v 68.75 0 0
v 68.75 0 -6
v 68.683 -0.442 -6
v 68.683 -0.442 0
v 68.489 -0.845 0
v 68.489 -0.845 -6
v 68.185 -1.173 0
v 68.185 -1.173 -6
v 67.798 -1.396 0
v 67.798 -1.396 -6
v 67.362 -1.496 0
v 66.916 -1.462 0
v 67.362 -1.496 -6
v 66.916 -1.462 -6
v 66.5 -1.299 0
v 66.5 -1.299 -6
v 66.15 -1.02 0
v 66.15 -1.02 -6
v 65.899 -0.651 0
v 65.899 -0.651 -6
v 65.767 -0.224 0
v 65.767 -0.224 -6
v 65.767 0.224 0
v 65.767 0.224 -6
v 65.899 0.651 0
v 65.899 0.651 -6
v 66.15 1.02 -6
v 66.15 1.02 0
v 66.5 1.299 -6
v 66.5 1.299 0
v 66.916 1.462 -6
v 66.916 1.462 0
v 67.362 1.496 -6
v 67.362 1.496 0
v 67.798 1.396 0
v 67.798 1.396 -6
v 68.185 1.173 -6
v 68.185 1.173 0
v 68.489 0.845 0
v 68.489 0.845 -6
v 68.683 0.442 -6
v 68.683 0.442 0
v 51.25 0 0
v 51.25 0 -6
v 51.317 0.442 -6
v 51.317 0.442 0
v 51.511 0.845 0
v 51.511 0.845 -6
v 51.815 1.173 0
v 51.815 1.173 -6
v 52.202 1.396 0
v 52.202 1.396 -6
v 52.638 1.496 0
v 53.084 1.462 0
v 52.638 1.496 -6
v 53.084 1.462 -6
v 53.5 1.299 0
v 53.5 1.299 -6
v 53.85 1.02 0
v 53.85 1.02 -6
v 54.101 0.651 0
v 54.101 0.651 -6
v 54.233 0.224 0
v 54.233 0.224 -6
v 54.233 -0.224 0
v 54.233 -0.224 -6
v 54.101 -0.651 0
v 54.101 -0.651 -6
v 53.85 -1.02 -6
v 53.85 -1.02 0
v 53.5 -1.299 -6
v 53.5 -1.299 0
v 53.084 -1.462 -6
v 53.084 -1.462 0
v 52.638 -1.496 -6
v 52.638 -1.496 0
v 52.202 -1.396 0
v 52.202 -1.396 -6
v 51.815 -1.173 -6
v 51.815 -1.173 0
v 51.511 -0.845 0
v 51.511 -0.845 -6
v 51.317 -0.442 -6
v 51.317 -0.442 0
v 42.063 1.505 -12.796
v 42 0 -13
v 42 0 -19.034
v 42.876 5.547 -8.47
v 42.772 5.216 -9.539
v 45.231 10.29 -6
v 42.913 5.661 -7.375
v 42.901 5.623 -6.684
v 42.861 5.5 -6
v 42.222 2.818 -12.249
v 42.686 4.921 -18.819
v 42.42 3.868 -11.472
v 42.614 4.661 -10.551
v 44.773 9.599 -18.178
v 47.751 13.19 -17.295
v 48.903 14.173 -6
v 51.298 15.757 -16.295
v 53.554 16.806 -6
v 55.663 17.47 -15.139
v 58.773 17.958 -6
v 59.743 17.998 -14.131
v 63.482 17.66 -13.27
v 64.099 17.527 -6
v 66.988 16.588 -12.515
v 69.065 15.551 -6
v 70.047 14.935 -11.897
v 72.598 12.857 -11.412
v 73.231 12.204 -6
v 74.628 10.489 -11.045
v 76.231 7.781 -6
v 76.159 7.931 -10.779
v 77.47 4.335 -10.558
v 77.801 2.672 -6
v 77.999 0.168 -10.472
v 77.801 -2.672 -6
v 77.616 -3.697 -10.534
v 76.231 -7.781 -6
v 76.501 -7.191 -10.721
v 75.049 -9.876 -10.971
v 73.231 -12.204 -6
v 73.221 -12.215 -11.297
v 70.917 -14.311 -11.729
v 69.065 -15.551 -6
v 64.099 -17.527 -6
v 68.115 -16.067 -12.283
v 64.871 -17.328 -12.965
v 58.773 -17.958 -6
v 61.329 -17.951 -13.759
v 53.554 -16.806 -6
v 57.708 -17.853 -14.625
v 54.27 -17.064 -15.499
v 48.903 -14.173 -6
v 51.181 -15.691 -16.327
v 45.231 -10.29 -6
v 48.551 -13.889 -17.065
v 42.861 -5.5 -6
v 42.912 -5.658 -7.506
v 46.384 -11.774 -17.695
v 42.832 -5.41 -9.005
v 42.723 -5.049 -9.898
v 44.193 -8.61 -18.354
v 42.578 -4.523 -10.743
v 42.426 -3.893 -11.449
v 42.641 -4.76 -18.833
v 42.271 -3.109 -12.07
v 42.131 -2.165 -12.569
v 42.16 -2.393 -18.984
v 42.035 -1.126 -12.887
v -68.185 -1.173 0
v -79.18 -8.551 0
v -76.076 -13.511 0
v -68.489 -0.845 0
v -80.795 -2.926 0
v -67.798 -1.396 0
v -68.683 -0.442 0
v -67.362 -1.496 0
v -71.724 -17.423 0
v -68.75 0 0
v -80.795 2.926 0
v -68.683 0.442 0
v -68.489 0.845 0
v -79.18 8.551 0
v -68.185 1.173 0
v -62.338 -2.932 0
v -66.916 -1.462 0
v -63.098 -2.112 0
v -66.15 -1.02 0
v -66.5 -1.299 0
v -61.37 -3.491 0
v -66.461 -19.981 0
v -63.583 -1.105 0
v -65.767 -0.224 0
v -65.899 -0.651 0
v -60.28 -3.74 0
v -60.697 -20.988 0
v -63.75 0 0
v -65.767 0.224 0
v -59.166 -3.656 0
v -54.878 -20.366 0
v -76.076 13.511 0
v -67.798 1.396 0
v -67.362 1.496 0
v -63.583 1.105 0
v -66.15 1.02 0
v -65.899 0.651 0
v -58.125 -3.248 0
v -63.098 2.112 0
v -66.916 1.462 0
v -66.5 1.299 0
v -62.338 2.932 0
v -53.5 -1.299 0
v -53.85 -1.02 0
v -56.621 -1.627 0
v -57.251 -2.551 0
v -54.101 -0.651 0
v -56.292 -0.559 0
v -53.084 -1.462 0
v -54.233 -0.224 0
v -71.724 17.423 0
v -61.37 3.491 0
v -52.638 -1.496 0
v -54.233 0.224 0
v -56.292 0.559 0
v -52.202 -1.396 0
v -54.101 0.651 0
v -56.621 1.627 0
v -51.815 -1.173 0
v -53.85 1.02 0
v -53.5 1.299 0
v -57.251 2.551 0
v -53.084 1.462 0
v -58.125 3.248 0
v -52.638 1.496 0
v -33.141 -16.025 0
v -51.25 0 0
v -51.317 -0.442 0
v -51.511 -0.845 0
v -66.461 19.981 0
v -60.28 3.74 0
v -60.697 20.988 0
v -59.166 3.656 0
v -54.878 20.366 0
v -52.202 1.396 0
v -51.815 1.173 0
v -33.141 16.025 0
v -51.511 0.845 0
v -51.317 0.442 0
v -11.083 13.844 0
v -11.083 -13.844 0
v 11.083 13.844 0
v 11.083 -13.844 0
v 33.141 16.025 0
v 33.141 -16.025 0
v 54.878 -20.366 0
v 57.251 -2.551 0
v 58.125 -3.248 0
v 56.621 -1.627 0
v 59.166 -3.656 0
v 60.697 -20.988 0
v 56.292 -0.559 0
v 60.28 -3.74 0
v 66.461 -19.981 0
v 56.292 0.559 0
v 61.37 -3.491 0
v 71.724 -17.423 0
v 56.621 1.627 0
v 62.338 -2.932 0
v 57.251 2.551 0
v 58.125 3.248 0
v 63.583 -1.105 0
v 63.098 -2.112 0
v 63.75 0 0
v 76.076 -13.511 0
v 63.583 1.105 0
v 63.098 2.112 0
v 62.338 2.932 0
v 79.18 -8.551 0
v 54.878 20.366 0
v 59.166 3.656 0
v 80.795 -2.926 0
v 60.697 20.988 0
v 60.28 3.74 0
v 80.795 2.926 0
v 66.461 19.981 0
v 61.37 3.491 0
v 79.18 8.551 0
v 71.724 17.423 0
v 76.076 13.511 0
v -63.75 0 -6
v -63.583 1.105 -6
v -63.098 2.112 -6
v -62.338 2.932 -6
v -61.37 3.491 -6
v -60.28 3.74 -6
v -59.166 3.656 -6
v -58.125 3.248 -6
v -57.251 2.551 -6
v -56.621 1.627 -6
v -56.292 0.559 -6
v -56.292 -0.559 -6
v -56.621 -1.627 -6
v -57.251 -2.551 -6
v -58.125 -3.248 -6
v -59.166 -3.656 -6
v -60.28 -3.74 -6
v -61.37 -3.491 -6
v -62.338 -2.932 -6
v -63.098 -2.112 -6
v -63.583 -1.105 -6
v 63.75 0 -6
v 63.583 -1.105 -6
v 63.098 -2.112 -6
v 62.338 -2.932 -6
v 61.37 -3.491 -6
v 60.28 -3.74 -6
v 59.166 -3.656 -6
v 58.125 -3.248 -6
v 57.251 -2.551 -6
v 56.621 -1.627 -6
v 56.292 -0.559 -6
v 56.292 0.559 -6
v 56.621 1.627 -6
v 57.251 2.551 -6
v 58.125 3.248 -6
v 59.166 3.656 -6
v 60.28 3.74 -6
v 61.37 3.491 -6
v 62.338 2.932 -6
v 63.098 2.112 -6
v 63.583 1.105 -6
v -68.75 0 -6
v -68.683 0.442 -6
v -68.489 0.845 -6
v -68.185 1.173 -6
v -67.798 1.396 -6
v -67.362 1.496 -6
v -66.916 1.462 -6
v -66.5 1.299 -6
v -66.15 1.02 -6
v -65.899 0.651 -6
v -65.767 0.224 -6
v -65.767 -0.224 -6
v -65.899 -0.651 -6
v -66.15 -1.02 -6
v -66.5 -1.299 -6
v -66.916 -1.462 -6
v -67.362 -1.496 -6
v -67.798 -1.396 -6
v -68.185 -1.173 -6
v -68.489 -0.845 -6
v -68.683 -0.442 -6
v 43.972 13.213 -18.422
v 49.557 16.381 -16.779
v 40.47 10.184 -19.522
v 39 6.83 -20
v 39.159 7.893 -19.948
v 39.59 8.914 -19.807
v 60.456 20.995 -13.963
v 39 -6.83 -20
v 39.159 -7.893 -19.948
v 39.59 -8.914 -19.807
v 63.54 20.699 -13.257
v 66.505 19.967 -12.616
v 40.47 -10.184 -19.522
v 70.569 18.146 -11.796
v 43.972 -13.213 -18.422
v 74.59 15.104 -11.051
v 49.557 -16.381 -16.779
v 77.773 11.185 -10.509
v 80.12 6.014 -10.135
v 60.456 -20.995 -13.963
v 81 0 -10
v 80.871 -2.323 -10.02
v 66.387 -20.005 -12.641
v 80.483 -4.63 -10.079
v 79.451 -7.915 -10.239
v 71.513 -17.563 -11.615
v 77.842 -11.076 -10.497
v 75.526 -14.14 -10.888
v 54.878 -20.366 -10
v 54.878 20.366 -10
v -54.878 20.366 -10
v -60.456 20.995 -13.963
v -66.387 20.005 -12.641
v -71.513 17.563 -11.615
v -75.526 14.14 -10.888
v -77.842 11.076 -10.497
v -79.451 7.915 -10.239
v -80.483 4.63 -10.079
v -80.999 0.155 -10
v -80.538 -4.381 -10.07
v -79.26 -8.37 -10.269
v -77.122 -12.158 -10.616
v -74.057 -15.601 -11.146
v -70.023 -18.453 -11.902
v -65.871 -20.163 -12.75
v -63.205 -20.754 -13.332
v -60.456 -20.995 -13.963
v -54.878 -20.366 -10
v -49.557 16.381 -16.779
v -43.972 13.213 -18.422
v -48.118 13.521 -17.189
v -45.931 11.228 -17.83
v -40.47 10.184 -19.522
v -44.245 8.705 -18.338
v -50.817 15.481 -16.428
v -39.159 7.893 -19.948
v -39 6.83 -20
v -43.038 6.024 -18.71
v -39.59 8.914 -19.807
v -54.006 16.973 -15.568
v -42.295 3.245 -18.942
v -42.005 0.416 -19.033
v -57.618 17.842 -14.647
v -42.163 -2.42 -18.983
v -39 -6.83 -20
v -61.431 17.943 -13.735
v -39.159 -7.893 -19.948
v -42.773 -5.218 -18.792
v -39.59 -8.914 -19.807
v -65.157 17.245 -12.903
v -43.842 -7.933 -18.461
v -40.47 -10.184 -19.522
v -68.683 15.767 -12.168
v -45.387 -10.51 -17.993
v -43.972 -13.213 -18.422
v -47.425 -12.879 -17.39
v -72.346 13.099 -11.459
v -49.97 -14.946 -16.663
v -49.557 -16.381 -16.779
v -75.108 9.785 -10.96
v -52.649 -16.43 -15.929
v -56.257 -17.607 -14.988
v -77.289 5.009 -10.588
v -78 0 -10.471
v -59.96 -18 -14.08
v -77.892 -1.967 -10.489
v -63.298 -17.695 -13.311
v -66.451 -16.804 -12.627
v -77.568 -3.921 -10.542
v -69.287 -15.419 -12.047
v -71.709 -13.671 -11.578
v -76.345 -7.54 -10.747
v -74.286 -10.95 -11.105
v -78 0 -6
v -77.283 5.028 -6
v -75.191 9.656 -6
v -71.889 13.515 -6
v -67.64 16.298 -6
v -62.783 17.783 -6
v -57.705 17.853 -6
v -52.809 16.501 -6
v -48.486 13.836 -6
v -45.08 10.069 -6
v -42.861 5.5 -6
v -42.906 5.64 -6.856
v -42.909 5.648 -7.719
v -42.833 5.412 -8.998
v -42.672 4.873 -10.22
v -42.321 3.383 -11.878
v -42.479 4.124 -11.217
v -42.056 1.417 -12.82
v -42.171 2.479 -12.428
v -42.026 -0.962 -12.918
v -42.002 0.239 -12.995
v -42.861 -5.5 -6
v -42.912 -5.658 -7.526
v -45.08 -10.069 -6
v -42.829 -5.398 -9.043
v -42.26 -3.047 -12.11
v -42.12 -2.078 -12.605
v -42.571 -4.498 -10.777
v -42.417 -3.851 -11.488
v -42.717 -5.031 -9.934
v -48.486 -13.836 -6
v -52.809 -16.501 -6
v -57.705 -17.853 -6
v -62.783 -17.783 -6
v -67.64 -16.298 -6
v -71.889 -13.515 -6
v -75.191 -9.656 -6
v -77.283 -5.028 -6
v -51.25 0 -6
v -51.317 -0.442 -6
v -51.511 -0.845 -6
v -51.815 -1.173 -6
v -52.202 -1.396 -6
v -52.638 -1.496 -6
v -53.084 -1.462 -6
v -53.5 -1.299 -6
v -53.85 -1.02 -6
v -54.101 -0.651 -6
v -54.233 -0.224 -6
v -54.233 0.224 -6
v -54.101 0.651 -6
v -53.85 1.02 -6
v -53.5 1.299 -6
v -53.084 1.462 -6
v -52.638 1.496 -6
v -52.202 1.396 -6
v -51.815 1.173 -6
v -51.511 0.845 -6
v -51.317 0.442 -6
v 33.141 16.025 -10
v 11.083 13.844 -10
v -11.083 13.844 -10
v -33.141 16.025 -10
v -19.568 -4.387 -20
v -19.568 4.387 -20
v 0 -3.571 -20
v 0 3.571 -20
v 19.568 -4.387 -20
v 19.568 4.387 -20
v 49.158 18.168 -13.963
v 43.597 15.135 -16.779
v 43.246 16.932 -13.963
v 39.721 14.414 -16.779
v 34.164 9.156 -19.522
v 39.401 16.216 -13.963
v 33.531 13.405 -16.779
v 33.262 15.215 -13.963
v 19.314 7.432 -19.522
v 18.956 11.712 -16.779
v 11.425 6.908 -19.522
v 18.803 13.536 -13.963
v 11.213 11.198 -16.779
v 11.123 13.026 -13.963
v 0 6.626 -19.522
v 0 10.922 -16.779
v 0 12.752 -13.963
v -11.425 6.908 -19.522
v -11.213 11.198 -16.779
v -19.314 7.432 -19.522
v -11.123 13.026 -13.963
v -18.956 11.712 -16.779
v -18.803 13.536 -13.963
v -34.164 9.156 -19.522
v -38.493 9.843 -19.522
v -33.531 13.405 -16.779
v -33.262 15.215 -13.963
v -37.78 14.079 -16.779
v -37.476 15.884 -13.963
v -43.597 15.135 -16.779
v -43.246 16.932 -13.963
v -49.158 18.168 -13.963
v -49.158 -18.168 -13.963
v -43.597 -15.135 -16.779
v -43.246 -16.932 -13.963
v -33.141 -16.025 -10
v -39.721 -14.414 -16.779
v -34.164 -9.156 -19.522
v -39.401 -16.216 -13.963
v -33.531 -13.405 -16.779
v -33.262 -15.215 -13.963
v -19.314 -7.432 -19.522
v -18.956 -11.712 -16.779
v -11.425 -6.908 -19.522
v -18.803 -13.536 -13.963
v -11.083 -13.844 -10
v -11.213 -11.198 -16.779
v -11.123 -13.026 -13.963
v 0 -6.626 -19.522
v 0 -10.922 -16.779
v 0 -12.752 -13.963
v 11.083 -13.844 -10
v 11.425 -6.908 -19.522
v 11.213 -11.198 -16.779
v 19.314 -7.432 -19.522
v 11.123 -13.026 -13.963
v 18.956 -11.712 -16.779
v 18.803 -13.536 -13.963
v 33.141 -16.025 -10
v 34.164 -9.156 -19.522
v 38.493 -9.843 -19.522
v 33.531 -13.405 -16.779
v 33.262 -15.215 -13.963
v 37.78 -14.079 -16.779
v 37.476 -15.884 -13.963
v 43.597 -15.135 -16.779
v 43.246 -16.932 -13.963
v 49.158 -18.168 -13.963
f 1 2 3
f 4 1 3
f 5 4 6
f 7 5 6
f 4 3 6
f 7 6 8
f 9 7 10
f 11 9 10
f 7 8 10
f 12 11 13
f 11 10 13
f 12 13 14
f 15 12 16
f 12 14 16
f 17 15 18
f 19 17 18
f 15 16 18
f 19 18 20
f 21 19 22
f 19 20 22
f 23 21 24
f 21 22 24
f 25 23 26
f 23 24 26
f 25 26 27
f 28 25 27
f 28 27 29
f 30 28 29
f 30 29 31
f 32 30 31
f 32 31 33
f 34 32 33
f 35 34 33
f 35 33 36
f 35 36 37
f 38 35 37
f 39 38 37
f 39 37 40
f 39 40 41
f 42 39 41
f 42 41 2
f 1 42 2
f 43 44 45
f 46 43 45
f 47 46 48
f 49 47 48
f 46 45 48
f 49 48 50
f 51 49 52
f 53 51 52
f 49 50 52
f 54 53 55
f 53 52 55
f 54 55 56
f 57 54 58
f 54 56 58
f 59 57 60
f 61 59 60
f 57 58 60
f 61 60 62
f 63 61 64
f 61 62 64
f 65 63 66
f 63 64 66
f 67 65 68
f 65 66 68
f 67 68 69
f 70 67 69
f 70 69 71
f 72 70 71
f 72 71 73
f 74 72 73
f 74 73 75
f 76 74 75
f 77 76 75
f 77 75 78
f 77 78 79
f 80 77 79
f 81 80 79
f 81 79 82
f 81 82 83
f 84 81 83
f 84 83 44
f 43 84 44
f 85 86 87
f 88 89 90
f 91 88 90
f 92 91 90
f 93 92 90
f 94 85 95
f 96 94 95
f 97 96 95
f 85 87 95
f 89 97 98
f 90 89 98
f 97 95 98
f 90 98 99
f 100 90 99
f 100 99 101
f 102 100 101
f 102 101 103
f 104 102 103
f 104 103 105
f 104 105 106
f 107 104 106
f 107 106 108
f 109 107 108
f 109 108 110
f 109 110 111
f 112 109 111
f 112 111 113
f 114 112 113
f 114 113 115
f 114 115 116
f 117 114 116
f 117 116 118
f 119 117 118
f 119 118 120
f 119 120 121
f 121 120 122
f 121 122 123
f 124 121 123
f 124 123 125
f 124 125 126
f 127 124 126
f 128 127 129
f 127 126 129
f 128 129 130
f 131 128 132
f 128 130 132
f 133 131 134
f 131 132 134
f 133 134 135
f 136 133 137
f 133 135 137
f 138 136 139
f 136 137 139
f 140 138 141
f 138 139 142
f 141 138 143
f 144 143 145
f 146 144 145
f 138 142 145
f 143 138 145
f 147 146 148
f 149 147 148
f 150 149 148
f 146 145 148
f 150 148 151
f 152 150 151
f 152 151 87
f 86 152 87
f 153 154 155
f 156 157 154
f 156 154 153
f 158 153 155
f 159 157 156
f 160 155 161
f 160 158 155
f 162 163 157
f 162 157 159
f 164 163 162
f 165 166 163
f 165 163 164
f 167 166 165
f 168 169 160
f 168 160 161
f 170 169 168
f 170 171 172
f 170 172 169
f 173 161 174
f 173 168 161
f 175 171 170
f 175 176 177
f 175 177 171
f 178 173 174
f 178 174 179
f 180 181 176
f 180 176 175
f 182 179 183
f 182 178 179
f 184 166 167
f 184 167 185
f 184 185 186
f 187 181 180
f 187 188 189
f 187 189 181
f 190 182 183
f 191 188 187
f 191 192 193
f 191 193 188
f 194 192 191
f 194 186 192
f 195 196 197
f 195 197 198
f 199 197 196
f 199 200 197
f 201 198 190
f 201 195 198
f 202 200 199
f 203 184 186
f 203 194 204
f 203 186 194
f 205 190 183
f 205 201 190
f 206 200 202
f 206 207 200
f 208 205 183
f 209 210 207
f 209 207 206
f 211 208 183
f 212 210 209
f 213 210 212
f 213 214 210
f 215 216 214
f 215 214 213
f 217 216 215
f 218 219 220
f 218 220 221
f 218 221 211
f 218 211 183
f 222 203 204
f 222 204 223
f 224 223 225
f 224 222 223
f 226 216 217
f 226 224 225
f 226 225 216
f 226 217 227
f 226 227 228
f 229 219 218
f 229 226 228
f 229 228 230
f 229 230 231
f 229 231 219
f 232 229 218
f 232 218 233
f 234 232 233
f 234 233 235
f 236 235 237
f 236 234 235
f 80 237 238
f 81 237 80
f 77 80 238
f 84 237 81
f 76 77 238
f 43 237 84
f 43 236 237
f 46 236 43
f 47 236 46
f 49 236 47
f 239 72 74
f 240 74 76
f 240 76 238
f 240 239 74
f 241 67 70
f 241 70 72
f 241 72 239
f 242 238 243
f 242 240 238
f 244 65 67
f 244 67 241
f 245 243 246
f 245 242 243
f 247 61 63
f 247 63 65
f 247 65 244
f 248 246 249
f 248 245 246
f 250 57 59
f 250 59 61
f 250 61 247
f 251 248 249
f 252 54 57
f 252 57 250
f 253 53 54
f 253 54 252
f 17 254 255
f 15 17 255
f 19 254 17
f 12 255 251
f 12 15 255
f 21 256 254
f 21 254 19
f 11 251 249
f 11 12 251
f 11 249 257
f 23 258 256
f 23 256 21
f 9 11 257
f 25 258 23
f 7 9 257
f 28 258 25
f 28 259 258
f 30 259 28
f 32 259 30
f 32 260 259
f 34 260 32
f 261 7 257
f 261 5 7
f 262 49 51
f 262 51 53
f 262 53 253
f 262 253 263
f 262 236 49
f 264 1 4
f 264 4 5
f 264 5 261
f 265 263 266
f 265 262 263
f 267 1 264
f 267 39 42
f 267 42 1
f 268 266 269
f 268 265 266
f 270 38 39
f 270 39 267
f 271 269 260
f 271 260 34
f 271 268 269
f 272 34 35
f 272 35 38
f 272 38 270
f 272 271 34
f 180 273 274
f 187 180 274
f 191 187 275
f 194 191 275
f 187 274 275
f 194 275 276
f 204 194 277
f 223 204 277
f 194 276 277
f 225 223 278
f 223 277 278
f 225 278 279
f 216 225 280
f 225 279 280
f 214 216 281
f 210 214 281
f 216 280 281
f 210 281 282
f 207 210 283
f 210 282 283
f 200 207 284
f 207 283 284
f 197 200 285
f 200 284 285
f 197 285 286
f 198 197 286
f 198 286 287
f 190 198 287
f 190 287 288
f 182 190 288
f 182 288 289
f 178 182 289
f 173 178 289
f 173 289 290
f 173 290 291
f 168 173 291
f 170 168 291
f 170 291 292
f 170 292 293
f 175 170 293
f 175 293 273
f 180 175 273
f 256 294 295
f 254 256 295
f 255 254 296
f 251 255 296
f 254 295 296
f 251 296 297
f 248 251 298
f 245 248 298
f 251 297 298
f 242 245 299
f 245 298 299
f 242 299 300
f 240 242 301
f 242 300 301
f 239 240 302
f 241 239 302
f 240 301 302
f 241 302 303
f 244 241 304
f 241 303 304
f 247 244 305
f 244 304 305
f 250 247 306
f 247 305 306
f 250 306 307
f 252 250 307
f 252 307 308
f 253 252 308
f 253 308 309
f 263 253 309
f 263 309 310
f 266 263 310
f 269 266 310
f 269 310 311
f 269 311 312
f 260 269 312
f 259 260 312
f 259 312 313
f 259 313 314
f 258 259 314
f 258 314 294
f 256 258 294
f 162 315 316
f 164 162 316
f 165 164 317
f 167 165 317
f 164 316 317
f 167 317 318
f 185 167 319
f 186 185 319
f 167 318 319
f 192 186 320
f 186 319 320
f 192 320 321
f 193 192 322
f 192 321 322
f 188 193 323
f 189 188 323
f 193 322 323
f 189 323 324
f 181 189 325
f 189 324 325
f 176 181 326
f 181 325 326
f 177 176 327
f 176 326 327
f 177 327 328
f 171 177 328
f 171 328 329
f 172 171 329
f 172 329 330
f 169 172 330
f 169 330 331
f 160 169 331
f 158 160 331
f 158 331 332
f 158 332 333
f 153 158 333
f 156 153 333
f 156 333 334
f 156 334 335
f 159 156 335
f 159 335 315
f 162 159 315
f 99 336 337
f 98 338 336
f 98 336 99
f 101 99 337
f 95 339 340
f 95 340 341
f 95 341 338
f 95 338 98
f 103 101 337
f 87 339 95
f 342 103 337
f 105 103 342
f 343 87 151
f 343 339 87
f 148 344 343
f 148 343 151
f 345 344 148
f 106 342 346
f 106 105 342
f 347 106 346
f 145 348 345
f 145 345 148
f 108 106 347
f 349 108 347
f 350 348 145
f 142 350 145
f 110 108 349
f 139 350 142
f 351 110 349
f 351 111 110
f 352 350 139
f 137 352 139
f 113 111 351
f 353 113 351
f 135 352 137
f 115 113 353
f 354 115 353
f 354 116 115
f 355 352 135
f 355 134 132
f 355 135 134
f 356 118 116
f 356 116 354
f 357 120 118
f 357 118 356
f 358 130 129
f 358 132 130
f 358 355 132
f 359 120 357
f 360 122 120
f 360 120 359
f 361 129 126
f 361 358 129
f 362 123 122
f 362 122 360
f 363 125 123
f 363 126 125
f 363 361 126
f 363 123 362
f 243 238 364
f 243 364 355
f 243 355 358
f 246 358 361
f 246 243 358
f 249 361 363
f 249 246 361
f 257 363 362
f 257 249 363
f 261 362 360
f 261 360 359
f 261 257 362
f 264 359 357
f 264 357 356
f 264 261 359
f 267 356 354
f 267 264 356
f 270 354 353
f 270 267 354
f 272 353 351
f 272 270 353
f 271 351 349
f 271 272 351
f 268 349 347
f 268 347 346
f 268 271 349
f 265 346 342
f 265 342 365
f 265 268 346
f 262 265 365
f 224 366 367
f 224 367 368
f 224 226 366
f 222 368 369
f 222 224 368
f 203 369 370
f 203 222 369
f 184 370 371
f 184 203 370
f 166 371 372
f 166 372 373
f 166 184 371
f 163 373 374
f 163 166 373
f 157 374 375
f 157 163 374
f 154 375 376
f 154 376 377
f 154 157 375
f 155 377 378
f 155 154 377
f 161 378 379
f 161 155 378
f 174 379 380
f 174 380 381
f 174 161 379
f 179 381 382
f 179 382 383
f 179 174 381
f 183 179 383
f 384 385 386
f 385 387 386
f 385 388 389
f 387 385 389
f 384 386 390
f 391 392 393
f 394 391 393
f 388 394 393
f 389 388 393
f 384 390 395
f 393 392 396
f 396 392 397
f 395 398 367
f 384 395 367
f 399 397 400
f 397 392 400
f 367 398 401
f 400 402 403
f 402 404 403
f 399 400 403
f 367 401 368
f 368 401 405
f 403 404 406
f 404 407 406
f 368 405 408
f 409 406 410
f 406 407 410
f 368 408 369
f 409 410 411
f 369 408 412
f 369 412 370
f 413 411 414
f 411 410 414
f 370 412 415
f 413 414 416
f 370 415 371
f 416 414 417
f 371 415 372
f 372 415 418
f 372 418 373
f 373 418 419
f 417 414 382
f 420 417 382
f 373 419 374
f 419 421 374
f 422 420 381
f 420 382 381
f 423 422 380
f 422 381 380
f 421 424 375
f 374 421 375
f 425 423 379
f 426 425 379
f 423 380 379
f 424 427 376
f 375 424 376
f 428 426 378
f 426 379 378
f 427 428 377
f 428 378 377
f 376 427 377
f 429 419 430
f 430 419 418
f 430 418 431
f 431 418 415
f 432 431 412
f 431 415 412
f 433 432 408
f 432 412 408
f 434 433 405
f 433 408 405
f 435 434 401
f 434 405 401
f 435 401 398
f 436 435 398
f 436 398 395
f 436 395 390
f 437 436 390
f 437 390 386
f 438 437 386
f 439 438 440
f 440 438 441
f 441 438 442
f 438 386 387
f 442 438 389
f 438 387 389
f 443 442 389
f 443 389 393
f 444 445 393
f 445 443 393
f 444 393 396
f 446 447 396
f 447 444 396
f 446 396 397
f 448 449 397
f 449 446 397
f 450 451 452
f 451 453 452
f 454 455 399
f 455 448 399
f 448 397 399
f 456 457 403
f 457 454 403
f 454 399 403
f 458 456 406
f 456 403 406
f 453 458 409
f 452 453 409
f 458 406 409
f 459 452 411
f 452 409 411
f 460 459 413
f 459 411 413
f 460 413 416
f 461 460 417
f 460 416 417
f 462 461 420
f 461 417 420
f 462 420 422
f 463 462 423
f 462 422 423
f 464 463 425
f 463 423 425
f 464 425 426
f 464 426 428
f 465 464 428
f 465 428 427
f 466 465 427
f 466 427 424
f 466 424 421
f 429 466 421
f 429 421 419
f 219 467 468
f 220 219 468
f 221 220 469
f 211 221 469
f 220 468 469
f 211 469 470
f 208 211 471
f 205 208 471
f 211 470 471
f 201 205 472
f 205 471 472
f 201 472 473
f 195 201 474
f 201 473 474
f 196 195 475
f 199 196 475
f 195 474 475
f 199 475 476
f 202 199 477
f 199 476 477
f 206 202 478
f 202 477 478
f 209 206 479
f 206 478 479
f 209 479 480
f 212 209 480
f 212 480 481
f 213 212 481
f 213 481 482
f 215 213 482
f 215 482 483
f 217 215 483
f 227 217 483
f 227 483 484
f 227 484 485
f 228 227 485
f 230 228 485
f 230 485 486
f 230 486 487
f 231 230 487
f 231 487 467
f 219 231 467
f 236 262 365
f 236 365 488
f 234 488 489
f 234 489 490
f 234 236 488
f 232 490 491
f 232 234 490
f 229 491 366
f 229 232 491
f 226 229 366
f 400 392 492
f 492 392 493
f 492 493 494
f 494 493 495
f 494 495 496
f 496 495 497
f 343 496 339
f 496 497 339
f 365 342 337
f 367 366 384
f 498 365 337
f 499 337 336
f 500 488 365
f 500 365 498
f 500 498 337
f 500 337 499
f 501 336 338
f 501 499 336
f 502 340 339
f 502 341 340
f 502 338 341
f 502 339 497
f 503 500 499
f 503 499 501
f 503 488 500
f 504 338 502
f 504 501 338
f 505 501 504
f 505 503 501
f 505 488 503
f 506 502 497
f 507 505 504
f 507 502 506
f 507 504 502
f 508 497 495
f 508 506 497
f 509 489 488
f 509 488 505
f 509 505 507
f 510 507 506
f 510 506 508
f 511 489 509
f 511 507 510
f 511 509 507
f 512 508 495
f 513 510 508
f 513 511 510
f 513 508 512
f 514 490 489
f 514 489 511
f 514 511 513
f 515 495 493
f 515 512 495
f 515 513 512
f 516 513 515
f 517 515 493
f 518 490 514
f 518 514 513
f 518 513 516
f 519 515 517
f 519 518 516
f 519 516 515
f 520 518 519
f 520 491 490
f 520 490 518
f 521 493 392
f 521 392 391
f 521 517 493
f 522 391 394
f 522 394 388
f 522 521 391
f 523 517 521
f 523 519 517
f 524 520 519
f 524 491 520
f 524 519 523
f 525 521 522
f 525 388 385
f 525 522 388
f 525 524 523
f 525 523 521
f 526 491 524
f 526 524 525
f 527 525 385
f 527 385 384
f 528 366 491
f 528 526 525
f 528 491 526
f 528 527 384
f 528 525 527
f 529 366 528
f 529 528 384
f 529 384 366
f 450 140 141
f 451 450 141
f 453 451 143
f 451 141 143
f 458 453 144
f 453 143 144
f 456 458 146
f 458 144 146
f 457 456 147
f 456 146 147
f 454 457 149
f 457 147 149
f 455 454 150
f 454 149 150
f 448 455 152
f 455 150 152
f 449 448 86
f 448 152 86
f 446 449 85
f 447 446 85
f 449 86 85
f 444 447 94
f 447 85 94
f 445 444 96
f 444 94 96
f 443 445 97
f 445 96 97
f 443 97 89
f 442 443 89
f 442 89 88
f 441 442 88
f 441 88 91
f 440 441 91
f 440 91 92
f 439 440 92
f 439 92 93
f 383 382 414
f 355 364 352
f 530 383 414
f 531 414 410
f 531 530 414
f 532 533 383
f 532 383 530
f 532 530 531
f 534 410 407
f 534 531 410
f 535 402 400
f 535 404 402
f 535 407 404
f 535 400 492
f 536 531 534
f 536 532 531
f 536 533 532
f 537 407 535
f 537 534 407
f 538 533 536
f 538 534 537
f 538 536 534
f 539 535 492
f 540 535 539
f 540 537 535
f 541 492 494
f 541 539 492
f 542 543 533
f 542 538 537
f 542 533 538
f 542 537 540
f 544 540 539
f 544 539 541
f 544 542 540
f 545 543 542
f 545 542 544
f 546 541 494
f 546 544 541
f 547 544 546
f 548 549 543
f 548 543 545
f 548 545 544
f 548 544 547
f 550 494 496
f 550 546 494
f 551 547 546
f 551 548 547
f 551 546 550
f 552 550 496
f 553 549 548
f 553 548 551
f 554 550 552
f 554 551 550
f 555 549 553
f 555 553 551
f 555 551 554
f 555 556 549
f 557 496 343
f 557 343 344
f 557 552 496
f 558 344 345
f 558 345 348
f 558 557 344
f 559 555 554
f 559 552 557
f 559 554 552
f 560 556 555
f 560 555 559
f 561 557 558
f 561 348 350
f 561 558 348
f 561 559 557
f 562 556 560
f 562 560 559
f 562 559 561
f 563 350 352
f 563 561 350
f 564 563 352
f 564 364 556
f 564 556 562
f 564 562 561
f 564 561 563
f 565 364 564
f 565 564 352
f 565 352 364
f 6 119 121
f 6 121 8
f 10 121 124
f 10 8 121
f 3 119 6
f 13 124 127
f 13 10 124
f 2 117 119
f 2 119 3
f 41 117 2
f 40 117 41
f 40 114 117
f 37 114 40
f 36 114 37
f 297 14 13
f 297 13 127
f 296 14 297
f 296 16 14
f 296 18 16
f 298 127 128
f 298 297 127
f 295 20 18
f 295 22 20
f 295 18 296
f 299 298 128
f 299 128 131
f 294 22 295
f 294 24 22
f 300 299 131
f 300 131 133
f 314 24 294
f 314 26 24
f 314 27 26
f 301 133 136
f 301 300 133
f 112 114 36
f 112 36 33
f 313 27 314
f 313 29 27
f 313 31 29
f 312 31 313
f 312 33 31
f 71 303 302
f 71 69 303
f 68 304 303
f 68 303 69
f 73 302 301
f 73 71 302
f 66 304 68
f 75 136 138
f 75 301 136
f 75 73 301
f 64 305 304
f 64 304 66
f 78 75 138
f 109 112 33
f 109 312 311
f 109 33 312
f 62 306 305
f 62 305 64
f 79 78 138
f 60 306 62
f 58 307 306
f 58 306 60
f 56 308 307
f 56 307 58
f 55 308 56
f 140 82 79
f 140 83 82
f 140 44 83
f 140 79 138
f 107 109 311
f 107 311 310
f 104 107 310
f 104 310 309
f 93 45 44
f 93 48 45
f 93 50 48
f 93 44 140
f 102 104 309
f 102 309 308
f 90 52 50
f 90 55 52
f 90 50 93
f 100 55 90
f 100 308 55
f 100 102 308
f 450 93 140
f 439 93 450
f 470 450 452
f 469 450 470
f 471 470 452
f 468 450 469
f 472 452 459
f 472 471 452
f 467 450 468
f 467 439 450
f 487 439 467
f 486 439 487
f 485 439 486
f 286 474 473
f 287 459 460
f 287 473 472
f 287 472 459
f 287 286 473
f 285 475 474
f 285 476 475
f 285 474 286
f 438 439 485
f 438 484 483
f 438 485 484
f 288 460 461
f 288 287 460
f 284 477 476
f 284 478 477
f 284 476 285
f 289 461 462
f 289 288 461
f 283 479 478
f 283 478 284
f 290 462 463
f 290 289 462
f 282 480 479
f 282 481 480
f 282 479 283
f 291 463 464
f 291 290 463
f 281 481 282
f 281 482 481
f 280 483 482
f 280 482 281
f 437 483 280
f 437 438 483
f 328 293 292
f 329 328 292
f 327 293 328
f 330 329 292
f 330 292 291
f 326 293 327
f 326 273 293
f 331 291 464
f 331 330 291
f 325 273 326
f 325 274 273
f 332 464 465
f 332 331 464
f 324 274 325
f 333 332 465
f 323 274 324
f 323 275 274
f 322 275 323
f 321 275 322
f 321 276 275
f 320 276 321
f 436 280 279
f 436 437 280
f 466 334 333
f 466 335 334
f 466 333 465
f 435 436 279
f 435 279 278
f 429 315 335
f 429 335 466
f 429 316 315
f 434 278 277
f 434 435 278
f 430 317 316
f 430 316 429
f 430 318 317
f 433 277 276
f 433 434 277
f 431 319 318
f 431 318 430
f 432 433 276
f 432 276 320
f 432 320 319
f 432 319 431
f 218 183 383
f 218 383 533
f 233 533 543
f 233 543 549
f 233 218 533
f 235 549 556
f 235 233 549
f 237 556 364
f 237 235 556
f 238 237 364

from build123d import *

# Parameters (mm, degrees)
SALIENTE_EXTRUIR1_DEPTH    = 20
CORTAR_EXTRUIR1_DEPTH      = 87.034876649
CORTAR_EXTRUIR1_DEPTH_BACK = 87.034876649
CROQUIS4_R                 = 18
CORTAR_EXTRUIR2_DEPTH      = 14
CROQUIS5_R                 = 3.75
CROQUIS5_R_2               = 1.5
CORTAR_EXTRUIR3_DEPTH      = 85.841027952
REDONDEO1_R                = 10
CORTAR_EXTRUIR4_DEPTH      = 47


with BuildPart() as part:
    # Croquis1 → Saliente-Extruir1 (new body)
    with BuildSketch(Plane.XY):
        with BuildLine():
            ThreePointArc((54.87804878, 20.365795239), (0, 13.570744225), (-54.87804878, 20.365795239))
            ThreePointArc((-54.87804878, 20.365795239), (-81, 0), (-54.87804878, -20.365795239))
            ThreePointArc((-54.87804878, -20.365795239), (0, -13.570744225), (54.87804878, -20.365795239))
            ThreePointArc((54.87804878, -20.365795239), (81, 0), (54.87804878, 20.365795239))
        make_face()
    extrude(amount=-SALIENTE_EXTRUIR1_DEPTH)

    # Croquis2 → Cortar-Extruir1 (cut, two sides: drawn at the far end of the back side and taken through both)
    with BuildSketch(Plane(origin=(0, 0, 0), x_dir=(1, 0, 0), z_dir=(0, 1, 0)).offset(-CORTAR_EXTRUIR1_DEPTH_BACK)):
        with BuildLine():
            Line((-81, 10), (-81, 20))
            Line((-81, 20), (-39, 20))
            ThreePointArc((-39, 20), (-59.790503904, 14.120116398), (-81, 10))
        make_face()
        with BuildLine():
            Line((81, 10), (81, 20))
            Line((81, 20), (39, 20))
            ThreePointArc((39, 20), (59.790503904, 14.120116398), (81, 10))
        make_face()
    extrude(amount=CORTAR_EXTRUIR1_DEPTH + CORTAR_EXTRUIR1_DEPTH_BACK, mode=Mode.SUBTRACT)

    # Croquis4 → Cortar-Extruir2 (cut)
    with BuildSketch(Plane(origin=(0, 0, -20), x_dir=(-1, 0, 0), z_dir=(0, 0, -1))):
        with Locations((60, 0)):
            Circle(CROQUIS4_R)
        with Locations((-60, 0)):
            Circle(CROQUIS4_R)
    extrude(amount=-CORTAR_EXTRUIR2_DEPTH, mode=Mode.SUBTRACT)

    # Croquis5 → Cortar-Extruir3 (cut, through all)
    with BuildSketch(Plane(origin=(0, 0, -6), x_dir=(-1, 0, 0), z_dir=(0, 0, -1))):
        with Locations((60, 0)):
            Circle(CROQUIS5_R)
        with Locations((67.25, 0)):
            Circle(CROQUIS5_R_2)
        with Locations(Location((52.75, 0, 0), (0, 0, 180))):
            Circle(CROQUIS5_R_2)
        with Locations(Location((-67.25, 0, 0), (0, 0, 180))):
            Circle(CROQUIS5_R_2)
        with Locations(Location((-60, 0, 0), (0, 0, 180))):
            Circle(CROQUIS5_R)
        with Locations((-52.75, 0)):
            Circle(CROQUIS5_R_2)
    extrude(amount=-CORTAR_EXTRUIR3_DEPTH, mode=Mode.SUBTRACT)

    # Redondeo1
    # the kernel refuses this fillet: 10 mm, written as the material it takes off along each edge
    with BuildSketch(Plane(origin=(0, -238.570744225, -20), x_dir=(-0.28147080374244887, 0.9595697924802447, 0), z_dir=(-0.9595697924802447, -0.28147080374244887, 0))) as redondeo1_piece_1:
        with BuildLine():
            CenterArc((225 + REDONDEO1_R, -REDONDEO1_R), REDONDEO1_R, 90, 90)
            Line((225, -REDONDEO1_R), (225, 0))
            Line((225, 0), (225 + REDONDEO1_R, 0))
        make_face()
    revolve(axis=Axis((0, -238.570744225, -20), (0, 0, -1)), revolution_arc=32.696012994, mode=Mode.SUBTRACT)
    with BuildSketch(Plane(origin=(0, 238.570744225, -20), x_dir=(0.28147080374244876, -0.9595697924802447, 0), z_dir=(0.9595697924802447, 0.28147080374244876, 0))) as redondeo1_piece_2:
        with BuildLine():
            CenterArc((225 + REDONDEO1_R, -REDONDEO1_R), REDONDEO1_R, 90, 90)
            Line((225 + REDONDEO1_R, 0), (225, 0))
            Line((225, 0), (225, -REDONDEO1_R))
        make_face()
    revolve(axis=Axis((0, 238.570744225, -20), (0, 0, -1)), revolution_arc=32.696012994, mode=Mode.SUBTRACT)

    # Croquis6 → Cortar-Extruir4 (cut, symmetric)
    with BuildSketch(Plane(origin=(0, 0, 0), x_dir=(0, 0, -1), z_dir=(1, 0, 0))):
        with BuildLine():
            Line((6, 5.5), (6, -5.5))
            ThreePointArc((6, -5.5), (13, 0), (6, 5.5))
        make_face()
    extrude(amount=CORTAR_EXTRUIR4_DEPTH, both=True, mode=Mode.SUBTRACT)


solid = part.part
